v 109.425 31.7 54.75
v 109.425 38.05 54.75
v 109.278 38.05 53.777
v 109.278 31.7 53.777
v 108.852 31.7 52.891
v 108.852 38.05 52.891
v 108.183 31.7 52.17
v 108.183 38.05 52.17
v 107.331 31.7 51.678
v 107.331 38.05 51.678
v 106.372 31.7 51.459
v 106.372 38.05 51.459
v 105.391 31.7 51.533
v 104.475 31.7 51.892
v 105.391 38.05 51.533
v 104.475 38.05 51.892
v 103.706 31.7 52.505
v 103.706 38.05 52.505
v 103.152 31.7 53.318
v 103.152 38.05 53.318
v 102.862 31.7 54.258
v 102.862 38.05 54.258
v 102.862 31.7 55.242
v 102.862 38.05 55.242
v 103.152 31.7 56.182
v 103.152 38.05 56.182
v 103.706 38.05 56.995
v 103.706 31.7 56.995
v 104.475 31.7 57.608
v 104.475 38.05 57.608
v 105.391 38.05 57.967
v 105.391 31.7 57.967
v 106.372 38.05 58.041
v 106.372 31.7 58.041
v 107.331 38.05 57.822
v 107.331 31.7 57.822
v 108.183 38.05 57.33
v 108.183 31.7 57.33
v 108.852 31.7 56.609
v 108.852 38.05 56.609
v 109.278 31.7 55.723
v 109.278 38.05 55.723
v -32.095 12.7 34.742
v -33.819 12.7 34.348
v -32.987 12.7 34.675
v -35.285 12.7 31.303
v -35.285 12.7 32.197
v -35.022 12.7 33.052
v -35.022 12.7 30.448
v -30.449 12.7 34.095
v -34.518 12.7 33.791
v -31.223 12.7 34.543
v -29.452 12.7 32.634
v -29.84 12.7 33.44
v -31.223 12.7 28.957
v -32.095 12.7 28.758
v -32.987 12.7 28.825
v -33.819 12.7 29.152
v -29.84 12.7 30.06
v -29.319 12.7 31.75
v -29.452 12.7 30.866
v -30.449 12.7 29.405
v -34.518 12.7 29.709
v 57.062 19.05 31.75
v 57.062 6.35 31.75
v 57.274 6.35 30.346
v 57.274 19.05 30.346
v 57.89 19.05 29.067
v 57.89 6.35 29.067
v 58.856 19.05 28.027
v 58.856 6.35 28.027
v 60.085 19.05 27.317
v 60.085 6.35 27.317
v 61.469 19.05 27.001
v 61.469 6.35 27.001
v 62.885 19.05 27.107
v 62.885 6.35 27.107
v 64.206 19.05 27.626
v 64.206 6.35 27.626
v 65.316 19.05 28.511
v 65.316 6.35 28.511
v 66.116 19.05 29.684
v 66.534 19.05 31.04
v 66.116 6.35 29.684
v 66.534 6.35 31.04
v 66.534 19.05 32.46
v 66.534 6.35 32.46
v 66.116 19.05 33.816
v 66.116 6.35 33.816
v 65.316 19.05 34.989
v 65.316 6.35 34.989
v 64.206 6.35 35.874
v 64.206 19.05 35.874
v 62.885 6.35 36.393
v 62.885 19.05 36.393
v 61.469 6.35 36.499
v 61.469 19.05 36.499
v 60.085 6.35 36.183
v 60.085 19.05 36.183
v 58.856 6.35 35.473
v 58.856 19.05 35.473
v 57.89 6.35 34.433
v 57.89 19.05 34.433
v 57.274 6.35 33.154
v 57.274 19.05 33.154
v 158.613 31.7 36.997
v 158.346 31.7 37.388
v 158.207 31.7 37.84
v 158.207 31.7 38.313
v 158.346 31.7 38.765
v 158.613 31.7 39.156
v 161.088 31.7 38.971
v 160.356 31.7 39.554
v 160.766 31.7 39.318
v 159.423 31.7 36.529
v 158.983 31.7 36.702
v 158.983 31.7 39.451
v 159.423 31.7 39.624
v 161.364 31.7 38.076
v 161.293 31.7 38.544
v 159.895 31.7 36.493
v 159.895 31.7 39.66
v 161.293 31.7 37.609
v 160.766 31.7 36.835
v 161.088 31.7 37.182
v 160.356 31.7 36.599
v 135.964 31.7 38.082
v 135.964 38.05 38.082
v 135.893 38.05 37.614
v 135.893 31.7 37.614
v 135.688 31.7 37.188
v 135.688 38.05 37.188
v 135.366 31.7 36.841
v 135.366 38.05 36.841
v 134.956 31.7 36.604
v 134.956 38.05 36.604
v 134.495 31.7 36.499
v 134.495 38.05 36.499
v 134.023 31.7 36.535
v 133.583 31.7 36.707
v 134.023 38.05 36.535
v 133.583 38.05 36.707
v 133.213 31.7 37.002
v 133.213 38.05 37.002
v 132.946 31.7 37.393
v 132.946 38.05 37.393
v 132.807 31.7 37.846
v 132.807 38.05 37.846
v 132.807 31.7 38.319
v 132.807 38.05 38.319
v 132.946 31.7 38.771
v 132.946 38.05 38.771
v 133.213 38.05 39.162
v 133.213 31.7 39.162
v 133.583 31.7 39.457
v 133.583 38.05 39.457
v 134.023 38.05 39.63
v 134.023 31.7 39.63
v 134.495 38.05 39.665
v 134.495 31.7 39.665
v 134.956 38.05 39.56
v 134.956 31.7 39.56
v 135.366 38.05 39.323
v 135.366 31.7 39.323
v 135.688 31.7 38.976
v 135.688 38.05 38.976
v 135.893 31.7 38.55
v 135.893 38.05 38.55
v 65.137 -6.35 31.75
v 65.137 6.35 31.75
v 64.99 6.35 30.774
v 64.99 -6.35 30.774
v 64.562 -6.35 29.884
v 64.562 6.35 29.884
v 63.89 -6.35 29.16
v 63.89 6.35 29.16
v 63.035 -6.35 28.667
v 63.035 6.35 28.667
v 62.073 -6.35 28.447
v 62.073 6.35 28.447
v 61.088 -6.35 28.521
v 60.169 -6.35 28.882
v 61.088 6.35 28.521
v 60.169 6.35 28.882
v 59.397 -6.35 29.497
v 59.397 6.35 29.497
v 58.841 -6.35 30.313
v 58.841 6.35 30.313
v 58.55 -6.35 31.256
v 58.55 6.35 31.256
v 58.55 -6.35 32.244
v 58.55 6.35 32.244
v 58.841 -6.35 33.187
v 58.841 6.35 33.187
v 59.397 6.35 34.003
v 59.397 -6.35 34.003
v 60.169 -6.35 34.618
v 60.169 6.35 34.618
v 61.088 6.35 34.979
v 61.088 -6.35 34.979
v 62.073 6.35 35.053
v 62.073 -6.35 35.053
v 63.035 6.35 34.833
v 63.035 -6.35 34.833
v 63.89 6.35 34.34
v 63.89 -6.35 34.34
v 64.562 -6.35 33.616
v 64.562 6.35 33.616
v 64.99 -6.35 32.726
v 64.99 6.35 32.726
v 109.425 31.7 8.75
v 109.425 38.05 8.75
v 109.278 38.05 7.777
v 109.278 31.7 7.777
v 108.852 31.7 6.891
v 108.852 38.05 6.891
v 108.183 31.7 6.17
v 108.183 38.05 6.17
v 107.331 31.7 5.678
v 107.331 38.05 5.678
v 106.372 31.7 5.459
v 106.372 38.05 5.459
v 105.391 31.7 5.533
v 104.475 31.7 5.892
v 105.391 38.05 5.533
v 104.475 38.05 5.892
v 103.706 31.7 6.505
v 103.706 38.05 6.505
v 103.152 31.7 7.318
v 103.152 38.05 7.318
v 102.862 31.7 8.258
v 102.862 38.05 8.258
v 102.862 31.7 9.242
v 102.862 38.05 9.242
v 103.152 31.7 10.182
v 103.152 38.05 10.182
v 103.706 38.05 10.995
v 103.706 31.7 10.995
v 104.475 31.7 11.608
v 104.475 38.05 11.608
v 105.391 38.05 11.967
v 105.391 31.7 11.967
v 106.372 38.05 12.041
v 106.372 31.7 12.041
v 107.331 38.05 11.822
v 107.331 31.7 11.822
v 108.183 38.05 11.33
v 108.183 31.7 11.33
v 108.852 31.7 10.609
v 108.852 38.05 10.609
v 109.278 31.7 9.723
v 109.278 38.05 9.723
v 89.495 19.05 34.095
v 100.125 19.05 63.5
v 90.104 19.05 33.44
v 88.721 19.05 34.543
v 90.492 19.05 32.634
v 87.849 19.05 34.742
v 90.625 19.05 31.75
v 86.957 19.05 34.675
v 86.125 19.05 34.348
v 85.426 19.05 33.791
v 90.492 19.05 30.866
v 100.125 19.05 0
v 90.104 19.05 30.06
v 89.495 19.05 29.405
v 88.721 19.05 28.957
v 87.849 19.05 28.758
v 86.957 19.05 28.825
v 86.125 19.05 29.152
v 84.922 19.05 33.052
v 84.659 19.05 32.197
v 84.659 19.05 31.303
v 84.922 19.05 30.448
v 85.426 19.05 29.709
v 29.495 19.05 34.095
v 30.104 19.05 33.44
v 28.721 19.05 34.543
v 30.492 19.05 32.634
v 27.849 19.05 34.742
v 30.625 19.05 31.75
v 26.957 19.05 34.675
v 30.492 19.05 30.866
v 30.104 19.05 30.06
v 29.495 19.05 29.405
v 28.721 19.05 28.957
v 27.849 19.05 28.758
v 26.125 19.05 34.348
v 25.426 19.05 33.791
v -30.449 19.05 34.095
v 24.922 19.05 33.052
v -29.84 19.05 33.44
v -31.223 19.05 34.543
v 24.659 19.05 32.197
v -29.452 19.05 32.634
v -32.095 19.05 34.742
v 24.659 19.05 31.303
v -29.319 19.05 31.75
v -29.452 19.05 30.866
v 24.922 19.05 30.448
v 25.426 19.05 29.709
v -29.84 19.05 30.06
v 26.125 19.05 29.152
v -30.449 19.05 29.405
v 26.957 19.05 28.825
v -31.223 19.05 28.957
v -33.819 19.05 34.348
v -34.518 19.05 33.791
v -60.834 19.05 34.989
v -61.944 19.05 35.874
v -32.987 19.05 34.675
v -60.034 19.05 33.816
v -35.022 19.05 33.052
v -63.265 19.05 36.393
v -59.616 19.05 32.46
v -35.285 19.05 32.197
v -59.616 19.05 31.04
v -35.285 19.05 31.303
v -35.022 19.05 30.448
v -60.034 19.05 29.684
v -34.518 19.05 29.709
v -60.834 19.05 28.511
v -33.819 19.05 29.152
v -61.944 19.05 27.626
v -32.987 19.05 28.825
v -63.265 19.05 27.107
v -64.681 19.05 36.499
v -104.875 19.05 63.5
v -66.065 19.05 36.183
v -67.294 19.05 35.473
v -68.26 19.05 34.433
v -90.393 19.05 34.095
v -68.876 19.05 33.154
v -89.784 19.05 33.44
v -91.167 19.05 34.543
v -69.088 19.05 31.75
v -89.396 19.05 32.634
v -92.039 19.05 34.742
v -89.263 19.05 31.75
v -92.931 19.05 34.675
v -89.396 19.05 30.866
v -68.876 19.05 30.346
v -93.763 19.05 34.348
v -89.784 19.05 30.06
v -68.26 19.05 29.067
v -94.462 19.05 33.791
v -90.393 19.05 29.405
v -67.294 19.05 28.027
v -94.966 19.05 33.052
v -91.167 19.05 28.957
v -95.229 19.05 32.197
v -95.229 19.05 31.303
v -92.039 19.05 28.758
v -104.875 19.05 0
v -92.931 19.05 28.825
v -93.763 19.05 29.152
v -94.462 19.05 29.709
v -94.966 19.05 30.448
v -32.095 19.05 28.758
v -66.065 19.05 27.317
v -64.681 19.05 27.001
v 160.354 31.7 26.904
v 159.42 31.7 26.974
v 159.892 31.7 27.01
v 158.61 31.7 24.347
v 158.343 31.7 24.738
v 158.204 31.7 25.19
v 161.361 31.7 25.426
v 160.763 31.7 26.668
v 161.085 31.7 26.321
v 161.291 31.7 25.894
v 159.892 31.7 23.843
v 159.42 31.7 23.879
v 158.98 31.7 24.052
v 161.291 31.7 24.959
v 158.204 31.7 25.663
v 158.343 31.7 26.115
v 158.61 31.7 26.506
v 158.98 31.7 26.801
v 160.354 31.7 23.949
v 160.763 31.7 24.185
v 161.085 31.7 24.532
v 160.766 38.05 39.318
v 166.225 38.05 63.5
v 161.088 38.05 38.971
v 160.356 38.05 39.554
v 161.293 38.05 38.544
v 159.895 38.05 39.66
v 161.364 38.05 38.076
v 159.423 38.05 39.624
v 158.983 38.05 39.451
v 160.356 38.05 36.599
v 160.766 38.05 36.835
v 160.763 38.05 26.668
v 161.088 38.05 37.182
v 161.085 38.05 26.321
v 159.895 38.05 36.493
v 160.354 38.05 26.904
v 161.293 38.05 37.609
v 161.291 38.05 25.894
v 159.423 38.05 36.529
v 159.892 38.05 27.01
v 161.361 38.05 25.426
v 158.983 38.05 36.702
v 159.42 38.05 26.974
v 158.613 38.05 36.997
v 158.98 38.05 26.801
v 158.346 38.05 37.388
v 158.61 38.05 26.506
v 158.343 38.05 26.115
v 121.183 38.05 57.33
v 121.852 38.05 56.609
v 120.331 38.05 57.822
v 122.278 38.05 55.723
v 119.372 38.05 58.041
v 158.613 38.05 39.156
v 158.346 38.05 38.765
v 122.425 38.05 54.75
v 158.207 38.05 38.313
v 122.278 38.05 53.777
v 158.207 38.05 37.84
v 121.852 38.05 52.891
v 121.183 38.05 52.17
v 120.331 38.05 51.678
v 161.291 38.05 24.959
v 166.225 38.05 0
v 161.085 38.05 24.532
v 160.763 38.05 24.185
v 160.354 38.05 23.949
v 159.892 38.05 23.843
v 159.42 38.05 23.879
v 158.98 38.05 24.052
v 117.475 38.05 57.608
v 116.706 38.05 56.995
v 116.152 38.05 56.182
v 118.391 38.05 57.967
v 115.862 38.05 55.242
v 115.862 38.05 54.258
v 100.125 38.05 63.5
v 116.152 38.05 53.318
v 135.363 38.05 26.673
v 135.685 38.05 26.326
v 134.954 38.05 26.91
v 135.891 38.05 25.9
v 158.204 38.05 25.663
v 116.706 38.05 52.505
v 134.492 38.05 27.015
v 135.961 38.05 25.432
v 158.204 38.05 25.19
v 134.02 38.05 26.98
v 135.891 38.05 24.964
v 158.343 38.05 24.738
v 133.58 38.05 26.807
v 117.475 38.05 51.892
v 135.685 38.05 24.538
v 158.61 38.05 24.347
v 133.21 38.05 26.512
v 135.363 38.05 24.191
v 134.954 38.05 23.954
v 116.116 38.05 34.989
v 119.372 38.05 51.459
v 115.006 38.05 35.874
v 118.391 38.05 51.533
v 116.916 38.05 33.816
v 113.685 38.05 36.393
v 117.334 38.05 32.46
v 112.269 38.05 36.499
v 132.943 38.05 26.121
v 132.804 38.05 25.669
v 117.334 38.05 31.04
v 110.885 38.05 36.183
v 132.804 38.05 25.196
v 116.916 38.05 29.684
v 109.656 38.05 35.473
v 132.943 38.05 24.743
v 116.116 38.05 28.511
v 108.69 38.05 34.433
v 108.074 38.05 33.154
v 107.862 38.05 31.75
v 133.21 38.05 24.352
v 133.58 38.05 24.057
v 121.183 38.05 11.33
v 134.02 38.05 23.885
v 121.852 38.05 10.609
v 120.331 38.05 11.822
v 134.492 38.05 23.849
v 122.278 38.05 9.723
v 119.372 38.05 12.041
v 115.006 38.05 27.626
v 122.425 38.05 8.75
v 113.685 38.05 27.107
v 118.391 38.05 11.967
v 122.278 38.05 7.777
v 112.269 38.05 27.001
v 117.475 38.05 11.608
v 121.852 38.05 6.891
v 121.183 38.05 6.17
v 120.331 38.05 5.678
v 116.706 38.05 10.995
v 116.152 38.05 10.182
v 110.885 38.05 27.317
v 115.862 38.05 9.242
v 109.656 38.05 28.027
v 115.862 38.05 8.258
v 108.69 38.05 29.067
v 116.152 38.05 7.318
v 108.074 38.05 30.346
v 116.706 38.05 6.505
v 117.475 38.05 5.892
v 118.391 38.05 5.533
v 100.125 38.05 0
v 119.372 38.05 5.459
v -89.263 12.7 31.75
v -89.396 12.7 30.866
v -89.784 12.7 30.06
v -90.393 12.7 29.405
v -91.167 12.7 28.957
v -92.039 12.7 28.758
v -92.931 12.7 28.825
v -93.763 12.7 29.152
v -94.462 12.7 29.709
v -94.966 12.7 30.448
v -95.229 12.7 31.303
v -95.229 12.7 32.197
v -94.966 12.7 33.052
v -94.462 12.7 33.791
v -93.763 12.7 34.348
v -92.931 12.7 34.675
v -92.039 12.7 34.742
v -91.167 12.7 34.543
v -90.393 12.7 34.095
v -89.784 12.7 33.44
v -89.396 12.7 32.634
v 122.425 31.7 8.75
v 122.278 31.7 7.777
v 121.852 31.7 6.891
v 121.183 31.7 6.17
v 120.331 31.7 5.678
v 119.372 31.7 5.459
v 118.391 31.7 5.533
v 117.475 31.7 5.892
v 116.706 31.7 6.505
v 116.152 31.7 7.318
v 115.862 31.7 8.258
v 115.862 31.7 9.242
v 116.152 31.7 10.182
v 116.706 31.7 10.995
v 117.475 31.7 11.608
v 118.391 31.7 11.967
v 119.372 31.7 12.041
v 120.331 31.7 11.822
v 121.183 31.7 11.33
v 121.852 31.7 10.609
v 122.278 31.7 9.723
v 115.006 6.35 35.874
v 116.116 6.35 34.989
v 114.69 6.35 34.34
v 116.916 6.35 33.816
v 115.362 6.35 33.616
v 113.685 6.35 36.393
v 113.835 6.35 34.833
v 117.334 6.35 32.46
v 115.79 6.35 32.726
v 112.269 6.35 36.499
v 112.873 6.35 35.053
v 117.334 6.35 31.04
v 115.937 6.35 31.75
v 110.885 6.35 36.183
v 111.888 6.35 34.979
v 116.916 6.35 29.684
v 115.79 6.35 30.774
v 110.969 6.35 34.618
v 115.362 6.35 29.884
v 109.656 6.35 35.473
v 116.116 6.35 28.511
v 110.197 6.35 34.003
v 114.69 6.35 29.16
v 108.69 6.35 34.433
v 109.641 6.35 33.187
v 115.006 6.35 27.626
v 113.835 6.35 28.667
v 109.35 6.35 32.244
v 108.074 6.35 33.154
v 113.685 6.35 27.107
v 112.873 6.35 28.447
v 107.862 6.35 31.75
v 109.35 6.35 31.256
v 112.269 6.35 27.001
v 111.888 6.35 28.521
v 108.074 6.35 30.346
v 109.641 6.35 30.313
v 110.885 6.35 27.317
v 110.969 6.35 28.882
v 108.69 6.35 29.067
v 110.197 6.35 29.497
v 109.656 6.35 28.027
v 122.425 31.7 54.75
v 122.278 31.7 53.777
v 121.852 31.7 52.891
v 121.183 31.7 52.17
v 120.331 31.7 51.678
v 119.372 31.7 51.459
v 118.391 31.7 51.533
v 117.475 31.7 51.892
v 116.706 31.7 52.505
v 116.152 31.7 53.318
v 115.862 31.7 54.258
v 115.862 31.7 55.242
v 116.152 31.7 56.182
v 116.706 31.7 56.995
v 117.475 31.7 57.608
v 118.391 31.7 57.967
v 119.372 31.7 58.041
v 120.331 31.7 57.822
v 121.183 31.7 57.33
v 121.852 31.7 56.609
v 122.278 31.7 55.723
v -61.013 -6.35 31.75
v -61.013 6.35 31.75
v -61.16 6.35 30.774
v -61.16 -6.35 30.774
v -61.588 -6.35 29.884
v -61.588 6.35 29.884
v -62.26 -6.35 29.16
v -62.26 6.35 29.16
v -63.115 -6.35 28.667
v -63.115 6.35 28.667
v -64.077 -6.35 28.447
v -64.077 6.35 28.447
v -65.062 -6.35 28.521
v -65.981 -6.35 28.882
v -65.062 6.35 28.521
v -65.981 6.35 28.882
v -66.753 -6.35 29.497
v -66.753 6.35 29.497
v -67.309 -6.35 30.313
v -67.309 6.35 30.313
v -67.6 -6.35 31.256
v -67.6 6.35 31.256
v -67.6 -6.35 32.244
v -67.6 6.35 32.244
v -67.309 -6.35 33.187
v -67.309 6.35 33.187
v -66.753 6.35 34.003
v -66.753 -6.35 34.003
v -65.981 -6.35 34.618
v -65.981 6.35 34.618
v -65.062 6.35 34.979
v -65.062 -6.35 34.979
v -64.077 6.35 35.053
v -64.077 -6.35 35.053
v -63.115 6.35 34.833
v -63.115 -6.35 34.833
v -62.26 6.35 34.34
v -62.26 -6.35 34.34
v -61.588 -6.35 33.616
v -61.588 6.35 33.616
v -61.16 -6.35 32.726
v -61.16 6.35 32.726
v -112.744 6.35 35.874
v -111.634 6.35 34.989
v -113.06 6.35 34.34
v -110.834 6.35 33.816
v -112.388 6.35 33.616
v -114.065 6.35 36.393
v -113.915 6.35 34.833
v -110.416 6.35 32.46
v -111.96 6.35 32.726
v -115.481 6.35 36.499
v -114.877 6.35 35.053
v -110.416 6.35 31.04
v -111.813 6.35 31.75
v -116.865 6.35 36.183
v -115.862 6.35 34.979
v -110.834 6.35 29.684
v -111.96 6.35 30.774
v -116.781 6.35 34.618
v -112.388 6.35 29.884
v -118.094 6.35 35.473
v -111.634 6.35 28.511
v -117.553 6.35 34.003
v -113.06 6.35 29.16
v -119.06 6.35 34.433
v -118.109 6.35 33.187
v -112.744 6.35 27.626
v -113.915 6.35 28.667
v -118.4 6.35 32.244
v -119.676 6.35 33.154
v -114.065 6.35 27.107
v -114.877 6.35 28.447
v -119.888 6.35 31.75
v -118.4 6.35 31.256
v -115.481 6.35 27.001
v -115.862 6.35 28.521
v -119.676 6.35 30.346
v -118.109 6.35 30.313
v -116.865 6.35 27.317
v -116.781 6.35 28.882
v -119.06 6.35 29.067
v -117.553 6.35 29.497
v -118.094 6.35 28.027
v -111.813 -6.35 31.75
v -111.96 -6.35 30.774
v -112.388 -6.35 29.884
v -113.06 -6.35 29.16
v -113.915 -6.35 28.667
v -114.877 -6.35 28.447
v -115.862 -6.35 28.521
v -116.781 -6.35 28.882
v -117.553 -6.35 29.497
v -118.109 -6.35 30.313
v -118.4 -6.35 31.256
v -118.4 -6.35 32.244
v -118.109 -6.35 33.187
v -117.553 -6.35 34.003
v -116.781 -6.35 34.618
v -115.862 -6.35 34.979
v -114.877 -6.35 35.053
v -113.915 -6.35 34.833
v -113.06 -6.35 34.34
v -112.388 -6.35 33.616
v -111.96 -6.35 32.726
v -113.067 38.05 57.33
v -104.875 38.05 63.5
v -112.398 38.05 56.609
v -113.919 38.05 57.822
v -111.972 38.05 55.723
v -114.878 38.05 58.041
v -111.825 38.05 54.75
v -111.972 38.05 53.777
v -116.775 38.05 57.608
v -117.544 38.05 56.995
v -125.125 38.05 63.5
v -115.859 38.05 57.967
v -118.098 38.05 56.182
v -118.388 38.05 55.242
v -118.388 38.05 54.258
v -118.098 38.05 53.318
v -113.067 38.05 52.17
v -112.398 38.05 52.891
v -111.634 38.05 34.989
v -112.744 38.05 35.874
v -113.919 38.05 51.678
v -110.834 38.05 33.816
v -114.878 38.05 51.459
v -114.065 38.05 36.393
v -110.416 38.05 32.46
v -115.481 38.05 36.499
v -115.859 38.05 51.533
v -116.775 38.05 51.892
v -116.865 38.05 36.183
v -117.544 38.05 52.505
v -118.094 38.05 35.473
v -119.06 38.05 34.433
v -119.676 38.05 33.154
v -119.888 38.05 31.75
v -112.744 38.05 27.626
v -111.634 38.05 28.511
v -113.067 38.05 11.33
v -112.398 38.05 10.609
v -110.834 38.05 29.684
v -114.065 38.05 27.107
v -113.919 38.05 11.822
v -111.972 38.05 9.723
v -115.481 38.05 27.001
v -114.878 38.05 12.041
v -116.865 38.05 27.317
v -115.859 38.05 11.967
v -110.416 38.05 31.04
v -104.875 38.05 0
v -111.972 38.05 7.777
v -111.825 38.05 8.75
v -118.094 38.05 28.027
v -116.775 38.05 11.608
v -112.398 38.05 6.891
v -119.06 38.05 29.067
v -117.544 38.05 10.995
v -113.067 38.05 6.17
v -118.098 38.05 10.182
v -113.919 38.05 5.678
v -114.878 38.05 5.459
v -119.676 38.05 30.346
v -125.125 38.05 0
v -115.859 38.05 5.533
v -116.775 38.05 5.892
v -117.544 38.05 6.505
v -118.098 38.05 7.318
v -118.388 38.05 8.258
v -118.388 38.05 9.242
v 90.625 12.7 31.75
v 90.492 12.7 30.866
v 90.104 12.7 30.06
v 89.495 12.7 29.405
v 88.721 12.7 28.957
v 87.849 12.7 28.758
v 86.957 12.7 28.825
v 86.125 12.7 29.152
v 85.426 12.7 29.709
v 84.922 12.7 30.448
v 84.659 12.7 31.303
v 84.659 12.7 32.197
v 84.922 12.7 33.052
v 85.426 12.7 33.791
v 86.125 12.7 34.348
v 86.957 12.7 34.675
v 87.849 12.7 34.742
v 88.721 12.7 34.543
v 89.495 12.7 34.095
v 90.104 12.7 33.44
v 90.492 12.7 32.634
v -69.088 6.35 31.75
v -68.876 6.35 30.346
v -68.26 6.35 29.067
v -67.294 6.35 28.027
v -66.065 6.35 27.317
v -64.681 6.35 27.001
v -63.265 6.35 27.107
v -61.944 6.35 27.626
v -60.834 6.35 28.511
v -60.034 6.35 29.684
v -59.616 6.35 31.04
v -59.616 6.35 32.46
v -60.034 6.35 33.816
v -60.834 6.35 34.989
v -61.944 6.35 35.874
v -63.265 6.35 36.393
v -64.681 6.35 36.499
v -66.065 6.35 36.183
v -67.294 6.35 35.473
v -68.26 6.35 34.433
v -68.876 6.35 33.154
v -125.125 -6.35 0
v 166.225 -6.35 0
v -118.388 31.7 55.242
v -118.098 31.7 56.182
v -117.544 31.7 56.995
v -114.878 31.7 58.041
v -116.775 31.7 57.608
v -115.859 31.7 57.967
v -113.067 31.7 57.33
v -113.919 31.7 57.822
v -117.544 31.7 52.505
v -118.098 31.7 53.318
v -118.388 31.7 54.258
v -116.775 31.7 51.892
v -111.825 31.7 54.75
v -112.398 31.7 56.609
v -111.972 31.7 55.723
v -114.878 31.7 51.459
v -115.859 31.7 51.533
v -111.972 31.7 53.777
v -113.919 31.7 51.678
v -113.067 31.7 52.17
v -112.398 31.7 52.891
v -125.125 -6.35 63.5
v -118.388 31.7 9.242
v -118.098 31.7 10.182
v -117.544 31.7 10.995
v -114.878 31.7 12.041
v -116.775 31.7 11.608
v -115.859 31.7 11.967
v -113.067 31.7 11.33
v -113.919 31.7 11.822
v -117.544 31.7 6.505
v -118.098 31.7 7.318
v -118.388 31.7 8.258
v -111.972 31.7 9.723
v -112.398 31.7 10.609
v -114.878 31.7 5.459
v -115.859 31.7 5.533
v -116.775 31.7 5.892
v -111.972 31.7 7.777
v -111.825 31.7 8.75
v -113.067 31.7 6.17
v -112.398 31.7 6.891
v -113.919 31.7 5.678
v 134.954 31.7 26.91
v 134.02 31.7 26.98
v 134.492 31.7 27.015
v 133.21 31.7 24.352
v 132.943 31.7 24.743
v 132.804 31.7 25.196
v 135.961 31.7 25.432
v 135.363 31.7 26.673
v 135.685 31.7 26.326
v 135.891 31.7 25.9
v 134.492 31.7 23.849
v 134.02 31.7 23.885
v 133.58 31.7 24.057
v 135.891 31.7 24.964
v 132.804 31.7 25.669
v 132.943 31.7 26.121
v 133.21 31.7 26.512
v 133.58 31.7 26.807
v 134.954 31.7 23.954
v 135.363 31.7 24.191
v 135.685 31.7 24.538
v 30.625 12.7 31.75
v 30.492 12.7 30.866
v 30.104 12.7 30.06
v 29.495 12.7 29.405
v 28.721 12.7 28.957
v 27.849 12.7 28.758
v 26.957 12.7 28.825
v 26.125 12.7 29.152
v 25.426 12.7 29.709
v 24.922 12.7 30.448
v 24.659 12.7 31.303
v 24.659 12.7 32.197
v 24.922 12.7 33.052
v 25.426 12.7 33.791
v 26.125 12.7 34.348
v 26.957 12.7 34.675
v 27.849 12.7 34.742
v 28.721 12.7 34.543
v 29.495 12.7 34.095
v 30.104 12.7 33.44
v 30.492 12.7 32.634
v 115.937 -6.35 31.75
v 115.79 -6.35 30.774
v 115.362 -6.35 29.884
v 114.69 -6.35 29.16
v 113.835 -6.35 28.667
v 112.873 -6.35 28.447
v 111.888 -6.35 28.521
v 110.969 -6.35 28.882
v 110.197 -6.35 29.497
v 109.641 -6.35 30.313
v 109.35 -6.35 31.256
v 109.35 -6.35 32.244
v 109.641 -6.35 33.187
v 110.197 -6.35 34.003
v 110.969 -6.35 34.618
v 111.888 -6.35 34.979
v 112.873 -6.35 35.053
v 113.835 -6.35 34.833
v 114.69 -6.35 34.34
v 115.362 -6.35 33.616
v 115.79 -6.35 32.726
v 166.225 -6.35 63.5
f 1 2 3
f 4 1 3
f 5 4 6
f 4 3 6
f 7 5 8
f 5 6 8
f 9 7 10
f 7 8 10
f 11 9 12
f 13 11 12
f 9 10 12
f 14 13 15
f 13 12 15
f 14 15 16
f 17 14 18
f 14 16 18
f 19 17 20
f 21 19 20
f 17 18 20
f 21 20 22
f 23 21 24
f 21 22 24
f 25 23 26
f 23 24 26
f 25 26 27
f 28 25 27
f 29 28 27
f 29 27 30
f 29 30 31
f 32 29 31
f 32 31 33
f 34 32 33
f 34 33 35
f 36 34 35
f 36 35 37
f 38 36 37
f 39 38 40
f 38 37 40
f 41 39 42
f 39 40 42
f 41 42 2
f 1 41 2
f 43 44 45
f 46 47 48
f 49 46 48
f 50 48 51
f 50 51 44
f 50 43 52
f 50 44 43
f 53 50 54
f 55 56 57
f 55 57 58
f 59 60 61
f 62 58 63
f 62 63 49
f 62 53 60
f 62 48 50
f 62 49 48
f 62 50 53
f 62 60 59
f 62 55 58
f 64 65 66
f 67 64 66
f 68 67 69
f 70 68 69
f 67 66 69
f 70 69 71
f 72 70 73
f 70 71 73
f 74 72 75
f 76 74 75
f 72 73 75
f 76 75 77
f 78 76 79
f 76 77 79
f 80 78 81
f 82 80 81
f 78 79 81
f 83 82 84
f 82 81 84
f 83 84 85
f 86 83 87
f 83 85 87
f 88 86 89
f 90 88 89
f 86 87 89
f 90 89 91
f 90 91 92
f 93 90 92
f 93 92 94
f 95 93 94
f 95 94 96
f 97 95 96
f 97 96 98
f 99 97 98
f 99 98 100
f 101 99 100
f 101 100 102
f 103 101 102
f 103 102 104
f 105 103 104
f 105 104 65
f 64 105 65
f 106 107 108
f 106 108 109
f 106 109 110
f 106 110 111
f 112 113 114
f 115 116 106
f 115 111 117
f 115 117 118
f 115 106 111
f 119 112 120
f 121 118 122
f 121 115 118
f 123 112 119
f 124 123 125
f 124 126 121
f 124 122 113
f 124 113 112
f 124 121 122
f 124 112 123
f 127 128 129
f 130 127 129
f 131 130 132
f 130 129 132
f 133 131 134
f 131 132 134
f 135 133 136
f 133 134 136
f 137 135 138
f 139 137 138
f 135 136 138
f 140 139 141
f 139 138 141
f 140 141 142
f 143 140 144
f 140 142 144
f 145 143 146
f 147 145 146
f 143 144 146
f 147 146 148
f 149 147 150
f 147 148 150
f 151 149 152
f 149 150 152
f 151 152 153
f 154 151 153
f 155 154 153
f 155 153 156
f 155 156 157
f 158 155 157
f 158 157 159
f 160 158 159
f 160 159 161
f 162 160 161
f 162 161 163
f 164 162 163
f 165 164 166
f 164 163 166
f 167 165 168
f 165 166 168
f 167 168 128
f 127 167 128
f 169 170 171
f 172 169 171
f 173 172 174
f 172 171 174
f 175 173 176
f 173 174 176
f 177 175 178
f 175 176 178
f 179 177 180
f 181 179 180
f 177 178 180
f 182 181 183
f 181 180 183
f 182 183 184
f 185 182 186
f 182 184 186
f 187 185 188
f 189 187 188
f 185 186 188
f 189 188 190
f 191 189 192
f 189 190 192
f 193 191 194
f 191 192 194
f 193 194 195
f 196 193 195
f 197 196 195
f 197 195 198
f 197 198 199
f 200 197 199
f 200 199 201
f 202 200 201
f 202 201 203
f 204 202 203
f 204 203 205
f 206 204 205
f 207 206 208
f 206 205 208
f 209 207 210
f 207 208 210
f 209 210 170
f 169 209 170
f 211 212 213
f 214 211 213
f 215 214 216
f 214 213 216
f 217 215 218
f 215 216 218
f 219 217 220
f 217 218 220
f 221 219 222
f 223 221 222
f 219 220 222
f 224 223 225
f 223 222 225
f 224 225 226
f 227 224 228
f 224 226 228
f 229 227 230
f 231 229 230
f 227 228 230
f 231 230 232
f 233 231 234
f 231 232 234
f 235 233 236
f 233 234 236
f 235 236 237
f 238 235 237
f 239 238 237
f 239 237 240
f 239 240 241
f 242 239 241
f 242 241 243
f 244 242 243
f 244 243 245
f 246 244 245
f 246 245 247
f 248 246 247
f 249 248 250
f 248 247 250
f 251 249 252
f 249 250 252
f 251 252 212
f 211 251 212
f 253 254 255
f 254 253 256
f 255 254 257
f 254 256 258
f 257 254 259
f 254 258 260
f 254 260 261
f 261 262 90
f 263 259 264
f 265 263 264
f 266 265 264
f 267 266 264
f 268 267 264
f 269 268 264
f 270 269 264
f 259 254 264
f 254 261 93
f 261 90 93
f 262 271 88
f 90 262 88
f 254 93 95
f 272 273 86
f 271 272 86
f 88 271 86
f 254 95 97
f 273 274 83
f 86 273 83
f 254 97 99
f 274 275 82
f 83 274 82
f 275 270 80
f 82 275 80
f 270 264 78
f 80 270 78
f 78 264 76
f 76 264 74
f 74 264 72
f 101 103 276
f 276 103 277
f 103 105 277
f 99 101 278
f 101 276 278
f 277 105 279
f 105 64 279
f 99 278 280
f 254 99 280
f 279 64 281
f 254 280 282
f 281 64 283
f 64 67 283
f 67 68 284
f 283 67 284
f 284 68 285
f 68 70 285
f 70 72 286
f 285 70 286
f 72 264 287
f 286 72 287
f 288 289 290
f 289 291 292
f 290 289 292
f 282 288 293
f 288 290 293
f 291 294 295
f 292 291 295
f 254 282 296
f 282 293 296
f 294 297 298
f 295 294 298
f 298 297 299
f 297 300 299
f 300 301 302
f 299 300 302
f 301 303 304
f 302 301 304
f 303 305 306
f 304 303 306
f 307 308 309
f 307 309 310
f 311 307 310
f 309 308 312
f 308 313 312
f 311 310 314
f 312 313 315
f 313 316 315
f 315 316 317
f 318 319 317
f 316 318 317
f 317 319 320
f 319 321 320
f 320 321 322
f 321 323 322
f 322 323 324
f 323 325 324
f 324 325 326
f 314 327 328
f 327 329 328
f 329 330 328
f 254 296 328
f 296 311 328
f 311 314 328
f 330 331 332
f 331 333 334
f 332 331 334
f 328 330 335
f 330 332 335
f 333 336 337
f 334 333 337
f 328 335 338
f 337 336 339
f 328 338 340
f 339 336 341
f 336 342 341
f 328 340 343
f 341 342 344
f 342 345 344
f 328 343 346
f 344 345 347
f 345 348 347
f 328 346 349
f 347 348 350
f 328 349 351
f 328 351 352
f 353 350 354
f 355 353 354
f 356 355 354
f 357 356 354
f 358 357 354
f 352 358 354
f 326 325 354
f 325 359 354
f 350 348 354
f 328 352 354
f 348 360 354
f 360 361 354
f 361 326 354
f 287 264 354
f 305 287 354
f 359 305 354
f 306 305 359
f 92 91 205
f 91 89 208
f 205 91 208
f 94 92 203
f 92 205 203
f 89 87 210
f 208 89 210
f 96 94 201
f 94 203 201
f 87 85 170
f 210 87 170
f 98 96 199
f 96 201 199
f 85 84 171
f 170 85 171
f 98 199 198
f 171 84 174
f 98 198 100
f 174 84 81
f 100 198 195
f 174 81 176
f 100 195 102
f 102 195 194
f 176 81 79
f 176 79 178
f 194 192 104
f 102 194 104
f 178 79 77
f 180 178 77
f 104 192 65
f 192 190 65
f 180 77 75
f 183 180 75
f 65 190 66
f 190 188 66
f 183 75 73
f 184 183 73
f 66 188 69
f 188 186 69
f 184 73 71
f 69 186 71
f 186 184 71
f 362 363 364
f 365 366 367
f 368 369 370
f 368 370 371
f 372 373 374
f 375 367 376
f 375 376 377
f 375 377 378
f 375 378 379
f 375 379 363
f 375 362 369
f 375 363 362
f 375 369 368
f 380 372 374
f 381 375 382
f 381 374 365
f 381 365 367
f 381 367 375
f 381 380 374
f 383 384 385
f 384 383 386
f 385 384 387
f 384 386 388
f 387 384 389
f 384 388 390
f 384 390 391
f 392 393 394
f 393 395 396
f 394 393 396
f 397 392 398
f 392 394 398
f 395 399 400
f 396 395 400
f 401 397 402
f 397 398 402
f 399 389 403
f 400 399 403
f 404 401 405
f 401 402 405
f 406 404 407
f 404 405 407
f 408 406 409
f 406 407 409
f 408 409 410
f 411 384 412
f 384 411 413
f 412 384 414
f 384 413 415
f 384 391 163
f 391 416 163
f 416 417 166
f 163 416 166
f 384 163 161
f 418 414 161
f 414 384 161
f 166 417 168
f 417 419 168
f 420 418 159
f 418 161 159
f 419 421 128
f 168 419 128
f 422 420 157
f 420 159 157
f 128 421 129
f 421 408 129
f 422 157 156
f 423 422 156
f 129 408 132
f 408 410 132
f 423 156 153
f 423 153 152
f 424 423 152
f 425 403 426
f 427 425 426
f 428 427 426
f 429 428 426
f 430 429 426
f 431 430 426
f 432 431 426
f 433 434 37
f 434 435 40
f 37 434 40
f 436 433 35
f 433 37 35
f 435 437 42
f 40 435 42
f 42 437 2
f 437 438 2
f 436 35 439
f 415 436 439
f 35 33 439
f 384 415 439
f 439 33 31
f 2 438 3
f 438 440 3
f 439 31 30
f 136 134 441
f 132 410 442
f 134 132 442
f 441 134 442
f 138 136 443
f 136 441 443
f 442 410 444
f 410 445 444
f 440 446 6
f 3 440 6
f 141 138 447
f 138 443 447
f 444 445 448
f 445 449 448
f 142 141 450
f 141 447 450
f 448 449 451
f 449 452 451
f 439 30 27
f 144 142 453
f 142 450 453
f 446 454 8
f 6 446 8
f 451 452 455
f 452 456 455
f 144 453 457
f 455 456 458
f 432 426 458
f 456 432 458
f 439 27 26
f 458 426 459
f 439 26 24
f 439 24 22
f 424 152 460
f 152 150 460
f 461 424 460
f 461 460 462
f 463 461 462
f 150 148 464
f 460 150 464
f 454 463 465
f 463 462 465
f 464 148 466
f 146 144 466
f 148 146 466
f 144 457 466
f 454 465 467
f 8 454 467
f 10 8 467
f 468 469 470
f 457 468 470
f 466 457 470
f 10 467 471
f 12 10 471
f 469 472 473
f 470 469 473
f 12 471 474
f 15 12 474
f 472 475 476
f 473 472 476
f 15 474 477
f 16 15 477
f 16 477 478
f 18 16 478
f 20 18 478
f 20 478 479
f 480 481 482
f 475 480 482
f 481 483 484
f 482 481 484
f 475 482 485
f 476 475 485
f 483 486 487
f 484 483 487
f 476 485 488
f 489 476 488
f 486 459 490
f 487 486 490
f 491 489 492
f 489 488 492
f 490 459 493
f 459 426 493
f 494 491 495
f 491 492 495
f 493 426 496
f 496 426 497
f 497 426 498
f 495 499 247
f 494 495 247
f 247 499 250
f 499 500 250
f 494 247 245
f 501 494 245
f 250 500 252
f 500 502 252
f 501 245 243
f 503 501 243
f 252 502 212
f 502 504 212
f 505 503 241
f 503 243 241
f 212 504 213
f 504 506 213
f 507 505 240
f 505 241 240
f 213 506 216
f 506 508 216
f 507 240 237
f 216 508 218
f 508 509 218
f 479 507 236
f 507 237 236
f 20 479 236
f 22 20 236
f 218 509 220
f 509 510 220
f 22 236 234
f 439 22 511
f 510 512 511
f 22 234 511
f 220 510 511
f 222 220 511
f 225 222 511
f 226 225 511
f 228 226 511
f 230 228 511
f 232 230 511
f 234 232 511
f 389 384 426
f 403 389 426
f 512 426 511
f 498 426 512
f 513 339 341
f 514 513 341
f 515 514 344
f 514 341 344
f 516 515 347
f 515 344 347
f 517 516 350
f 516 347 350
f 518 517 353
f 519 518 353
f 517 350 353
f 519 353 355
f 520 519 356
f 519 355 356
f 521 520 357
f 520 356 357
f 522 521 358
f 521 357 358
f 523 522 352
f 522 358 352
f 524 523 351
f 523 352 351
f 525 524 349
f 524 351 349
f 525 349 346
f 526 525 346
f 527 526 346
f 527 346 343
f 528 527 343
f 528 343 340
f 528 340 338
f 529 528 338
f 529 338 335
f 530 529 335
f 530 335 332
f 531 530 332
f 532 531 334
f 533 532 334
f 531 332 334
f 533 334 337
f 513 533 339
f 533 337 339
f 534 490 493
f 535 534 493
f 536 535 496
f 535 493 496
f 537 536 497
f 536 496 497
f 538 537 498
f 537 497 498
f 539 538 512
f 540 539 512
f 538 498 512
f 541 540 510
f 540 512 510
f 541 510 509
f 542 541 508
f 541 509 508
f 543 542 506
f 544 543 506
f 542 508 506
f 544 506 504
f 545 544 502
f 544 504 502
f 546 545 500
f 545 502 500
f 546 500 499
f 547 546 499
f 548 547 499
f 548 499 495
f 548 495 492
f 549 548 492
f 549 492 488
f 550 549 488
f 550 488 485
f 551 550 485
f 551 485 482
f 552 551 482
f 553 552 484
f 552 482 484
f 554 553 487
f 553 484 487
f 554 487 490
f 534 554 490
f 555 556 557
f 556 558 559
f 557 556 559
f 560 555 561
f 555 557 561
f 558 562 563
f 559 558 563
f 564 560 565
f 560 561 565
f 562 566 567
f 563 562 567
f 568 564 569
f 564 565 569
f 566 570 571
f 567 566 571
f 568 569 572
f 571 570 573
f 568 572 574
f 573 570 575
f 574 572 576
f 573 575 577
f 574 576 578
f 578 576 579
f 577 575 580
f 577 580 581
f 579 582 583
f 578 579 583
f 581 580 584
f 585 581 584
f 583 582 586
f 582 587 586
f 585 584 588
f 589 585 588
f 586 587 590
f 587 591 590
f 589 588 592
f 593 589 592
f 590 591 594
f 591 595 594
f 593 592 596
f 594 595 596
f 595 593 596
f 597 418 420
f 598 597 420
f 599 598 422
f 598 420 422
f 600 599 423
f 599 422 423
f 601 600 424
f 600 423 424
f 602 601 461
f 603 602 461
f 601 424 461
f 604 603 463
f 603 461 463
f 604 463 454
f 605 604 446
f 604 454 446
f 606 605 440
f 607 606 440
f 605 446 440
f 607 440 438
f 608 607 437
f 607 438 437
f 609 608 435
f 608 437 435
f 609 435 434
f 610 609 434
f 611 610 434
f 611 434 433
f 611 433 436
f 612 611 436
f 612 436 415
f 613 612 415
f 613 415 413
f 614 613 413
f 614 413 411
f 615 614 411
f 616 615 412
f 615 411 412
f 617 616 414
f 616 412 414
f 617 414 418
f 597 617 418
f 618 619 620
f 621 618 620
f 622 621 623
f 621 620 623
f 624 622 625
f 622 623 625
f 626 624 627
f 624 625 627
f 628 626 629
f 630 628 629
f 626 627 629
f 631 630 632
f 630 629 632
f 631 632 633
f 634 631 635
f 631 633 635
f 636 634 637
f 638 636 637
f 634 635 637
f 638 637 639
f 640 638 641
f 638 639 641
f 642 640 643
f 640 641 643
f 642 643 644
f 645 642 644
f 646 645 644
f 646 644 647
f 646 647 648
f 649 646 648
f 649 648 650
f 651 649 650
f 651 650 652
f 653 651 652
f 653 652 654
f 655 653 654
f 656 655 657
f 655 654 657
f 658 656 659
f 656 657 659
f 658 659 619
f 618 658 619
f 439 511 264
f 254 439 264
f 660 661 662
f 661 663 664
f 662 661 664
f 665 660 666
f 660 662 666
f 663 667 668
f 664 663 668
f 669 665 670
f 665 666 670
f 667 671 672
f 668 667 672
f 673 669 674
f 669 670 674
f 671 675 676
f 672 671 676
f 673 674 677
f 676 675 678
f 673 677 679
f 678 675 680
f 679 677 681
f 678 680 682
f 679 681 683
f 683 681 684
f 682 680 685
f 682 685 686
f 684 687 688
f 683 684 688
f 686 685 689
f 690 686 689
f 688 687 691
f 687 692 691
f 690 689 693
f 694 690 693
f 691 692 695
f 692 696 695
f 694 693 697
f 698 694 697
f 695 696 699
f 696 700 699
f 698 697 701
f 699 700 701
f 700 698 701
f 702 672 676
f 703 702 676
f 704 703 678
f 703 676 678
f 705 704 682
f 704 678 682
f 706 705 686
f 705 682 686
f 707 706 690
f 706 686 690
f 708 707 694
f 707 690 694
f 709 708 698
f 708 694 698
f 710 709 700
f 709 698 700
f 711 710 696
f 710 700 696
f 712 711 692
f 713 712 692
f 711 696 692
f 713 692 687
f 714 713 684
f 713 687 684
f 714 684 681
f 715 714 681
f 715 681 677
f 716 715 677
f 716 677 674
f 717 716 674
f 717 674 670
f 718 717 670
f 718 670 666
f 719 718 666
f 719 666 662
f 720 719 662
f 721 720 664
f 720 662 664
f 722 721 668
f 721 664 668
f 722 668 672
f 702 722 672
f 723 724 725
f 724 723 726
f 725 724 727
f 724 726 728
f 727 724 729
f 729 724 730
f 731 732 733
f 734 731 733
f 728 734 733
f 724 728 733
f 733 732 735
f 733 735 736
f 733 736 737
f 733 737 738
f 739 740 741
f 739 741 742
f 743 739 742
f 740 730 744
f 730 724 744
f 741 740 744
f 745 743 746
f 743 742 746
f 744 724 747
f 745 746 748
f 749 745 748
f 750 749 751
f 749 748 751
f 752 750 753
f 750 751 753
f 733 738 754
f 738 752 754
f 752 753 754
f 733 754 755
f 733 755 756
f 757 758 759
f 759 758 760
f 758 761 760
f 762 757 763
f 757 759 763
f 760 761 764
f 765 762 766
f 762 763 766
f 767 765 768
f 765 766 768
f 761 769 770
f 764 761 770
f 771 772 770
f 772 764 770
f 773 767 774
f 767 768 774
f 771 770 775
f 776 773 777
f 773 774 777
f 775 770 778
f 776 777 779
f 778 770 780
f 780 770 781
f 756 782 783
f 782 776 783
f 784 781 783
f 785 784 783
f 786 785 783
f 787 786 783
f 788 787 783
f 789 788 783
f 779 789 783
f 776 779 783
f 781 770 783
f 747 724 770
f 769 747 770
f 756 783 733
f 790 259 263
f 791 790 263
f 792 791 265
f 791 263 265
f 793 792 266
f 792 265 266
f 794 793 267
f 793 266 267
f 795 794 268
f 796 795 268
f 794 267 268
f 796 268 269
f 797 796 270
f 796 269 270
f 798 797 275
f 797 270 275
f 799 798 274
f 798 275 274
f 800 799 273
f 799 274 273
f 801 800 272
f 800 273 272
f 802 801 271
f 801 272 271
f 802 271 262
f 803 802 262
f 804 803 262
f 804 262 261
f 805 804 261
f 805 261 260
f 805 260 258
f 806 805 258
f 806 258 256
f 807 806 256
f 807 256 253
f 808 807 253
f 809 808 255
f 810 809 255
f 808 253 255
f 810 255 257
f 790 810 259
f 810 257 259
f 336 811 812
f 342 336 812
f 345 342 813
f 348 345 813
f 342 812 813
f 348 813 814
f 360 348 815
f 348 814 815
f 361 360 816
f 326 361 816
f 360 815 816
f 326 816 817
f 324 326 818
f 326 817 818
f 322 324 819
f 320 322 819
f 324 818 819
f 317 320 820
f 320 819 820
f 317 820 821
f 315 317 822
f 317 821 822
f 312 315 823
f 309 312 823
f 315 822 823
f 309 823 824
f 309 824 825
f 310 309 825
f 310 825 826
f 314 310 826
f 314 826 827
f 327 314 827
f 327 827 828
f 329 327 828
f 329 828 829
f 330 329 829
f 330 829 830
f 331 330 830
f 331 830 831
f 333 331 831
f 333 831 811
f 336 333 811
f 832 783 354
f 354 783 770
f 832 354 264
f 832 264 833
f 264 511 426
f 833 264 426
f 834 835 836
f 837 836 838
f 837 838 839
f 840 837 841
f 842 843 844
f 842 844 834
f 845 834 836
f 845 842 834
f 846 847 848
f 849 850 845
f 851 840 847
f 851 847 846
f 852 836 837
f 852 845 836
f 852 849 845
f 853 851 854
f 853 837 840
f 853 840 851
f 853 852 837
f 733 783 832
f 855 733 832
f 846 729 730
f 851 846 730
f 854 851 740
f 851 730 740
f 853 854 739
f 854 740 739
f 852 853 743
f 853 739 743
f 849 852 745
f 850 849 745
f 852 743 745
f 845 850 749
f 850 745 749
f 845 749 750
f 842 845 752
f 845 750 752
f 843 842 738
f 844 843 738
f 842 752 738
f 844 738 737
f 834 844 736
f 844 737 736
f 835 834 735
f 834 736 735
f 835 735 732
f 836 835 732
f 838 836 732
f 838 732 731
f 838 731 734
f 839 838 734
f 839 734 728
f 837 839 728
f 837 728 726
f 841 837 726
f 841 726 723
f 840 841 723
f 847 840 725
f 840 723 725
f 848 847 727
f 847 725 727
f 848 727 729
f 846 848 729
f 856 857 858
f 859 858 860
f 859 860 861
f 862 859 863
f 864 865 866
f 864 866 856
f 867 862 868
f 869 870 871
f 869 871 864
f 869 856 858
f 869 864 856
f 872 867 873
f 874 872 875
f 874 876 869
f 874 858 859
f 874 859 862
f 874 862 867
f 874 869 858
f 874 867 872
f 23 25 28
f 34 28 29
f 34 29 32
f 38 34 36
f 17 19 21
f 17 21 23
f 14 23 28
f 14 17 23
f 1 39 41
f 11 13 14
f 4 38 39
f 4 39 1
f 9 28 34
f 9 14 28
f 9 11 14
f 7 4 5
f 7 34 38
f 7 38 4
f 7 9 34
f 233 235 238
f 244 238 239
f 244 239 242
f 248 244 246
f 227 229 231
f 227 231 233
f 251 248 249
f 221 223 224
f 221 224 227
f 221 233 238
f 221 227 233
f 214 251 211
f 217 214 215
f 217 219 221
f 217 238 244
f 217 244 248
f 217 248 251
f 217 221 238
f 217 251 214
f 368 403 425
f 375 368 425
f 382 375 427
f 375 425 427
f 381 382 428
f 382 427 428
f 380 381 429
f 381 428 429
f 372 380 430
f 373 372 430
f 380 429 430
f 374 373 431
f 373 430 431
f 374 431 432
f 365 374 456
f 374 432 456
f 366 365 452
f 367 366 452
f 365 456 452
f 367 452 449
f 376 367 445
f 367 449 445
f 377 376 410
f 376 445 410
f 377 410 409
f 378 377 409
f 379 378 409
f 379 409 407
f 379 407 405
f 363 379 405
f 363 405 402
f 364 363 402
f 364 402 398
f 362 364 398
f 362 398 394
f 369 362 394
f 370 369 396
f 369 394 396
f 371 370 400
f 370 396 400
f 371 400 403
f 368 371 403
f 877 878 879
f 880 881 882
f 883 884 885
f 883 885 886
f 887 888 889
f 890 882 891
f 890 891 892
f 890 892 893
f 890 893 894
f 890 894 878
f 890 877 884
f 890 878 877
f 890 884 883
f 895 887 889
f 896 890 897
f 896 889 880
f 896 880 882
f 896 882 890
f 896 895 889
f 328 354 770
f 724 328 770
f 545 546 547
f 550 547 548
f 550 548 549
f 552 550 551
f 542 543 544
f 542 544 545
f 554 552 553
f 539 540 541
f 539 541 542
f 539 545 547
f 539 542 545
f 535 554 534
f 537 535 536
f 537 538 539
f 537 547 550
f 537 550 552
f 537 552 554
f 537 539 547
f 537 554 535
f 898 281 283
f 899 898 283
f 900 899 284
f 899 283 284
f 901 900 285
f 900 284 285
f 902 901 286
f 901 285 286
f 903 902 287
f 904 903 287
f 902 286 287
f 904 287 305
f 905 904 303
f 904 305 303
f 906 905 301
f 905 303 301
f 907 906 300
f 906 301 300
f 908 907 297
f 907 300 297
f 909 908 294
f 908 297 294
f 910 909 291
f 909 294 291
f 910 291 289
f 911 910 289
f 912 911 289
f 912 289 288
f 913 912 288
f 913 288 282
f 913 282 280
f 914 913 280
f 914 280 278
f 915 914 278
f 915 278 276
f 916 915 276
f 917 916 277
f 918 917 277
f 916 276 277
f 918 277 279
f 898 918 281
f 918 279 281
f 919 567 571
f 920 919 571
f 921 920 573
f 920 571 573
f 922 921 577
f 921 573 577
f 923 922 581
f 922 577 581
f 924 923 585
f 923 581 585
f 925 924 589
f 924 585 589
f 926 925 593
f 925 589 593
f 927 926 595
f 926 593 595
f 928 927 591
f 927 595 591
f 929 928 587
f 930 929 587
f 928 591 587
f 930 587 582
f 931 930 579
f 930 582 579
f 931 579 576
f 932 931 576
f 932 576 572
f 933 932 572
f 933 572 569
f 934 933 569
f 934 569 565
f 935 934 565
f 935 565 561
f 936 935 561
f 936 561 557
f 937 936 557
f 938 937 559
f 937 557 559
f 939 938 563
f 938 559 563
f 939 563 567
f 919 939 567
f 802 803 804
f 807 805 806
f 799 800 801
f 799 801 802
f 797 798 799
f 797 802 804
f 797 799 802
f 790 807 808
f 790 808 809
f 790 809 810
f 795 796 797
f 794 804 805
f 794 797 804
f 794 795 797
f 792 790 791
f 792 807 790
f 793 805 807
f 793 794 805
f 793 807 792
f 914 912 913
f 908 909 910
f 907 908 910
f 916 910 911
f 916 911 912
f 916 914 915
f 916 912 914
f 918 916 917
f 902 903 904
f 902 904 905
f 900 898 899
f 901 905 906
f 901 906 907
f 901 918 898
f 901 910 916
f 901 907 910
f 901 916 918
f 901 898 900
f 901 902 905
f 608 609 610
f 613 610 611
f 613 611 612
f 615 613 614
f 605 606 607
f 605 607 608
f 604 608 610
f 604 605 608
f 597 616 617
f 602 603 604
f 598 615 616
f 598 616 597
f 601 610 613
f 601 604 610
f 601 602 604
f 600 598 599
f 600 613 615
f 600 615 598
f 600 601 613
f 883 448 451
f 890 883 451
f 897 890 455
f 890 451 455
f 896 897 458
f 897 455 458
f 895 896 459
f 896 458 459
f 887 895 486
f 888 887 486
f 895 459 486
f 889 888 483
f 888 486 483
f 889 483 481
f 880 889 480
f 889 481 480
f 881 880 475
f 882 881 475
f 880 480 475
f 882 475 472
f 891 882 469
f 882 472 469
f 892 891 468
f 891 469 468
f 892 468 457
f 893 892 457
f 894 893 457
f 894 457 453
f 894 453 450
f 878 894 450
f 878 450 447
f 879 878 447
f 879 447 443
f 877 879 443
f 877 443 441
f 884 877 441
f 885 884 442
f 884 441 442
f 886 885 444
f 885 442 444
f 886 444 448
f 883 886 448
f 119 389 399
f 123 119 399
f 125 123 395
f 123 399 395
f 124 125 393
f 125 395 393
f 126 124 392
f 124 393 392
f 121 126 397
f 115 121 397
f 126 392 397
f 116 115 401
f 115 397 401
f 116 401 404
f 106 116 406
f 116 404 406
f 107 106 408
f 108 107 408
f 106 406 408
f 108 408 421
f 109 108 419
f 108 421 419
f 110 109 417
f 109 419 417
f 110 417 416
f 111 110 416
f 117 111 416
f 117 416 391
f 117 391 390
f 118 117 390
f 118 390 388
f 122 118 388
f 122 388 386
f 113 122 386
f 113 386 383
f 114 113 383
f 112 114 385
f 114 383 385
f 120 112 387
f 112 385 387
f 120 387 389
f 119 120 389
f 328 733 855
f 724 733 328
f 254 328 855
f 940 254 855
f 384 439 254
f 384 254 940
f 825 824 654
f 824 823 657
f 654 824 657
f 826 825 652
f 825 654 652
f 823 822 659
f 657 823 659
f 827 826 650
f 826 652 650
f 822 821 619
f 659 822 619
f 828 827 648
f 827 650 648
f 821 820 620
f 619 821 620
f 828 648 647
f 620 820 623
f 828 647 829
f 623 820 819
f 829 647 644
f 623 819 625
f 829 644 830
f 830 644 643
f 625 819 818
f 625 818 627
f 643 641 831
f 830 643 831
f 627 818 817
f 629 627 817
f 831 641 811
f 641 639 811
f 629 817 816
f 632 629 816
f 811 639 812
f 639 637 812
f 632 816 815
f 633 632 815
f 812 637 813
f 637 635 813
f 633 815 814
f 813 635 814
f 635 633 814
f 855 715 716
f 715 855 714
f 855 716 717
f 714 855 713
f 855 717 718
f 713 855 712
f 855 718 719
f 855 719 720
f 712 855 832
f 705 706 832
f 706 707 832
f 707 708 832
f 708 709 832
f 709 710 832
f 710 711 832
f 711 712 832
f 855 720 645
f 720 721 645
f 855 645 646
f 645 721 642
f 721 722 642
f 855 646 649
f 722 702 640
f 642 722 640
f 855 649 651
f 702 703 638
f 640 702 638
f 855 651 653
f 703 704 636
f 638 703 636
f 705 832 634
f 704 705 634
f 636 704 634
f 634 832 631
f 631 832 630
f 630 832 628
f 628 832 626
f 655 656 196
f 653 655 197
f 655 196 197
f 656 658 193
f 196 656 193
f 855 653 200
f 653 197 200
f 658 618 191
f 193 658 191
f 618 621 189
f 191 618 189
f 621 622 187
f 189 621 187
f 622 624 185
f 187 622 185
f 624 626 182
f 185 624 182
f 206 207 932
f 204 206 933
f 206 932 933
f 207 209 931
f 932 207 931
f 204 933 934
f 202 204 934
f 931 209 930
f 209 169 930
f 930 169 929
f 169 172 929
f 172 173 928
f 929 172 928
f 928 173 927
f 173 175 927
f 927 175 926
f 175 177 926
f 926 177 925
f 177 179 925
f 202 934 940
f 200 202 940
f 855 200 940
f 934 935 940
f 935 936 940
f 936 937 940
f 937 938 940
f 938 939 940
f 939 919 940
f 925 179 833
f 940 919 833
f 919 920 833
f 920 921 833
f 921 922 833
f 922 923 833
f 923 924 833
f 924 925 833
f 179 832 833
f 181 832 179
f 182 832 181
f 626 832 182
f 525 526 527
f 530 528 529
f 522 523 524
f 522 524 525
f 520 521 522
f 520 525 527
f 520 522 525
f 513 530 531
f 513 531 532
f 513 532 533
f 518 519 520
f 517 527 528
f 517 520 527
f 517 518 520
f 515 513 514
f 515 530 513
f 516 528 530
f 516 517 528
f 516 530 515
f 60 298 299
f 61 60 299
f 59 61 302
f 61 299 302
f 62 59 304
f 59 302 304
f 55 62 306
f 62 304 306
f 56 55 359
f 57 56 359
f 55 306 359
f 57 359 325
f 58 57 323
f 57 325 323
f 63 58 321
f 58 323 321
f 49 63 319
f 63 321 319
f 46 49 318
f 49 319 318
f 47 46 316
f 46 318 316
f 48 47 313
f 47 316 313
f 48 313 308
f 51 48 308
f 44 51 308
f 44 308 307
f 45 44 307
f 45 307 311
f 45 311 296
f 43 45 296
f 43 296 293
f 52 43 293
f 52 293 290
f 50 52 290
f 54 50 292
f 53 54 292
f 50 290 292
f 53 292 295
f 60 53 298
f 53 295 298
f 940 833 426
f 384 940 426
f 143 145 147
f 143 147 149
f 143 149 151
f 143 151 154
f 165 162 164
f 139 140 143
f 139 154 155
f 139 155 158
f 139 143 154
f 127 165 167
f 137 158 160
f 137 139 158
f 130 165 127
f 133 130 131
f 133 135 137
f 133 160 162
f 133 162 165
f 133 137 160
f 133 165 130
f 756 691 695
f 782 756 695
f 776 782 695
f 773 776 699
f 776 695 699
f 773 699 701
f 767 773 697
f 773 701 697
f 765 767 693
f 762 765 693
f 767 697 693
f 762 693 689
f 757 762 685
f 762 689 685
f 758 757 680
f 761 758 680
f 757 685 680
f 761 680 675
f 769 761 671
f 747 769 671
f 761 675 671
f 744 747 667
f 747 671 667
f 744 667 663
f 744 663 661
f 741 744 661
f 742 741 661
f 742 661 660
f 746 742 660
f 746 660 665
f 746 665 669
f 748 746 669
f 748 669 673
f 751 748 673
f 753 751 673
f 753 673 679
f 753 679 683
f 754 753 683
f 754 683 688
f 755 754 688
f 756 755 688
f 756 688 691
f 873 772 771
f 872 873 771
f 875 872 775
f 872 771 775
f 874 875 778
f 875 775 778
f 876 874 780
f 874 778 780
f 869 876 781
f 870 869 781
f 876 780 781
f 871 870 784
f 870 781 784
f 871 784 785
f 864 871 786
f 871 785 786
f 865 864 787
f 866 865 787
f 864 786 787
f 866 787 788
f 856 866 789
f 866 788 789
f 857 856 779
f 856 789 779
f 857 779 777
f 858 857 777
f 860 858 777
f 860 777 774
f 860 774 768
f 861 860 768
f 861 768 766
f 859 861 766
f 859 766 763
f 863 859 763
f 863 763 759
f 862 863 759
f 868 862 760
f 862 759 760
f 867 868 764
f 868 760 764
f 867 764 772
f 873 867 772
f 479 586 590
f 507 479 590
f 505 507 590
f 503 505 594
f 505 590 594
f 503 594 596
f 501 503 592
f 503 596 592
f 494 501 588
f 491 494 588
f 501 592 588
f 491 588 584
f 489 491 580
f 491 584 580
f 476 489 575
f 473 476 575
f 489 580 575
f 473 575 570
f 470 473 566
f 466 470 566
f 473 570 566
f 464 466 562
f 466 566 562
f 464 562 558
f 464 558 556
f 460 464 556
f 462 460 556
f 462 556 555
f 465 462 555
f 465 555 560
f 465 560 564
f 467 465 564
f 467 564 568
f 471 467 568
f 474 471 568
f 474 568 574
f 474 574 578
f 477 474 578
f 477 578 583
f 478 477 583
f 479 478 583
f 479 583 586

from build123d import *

# Parameters (mm, degrees)
SKETCH1_W                       = 41.1
SKETCH1_H                       = 38.05
MAIN_EXTRUDE_DEPTH              = 63.5
SKETCH3_R                       = 3.3
RAIL_BLOCK_MOUNTING_HOLES_DEPTH = 6.35
SKETCH4_R                       = 1.5875
MOTOR_MOUNTING_HOLES_DEPTH      = 6.35
SKETCH8_R                       = 3
RAIL_MOUNTING_HOLES_DEPTH       = 6.35
SKETCH5_R                       = 3.31216
CUT_EXTRUDE3_DEPTH              = 39.05
CUT_EXTRUDE3_DEPTH_BACK         = 7.35
SKETCH7_R                       = 4.7625
CUT_EXTRUDE6_DEPTH              = 32.7


with BuildPart() as part:
    # Sketch1 → Main Extrude (new body)
    with BuildSketch(Plane.XY):
        Polygon((125.125, 0), (-125.125, 0), (-125.125, -6.35), (166.225, -6.35), (166.225, 0), align=None)
        Polygon((-125.125, 38.05), (-125.125, 0), (125.125, 0), (125.125, 38.05), (100.125, 38.05), (100.125, 19.05), (-104.875, 19.05), (-104.875, 38.05), align=None)
        with Locations((145.675, 19.025)):
            Rectangle(SKETCH1_W, SKETCH1_H)
    extrude(amount=MAIN_EXTRUDE_DEPTH)

    # Sketch3 → Rail Block Mounting Holes (cut)
    with BuildSketch(Plane(origin=(0, 38.05, 0), x_dir=(1, 0, 0), z_dir=(0, 1, 0))):
        with Locations((106.125, -54.75)):
            Circle(SKETCH3_R)
        with Locations((119.125, -54.75)):
            Circle(SKETCH3_R)
        with Locations((106.125, -8.75)):
            Circle(SKETCH3_R)
        with Locations((119.125, -8.75)):
            Circle(SKETCH3_R)
        with Locations((-115.125, -54.75)):
            Circle(SKETCH3_R)
        with Locations((-115.125, -8.75)):
            Circle(SKETCH3_R)
    extrude(amount=-RAIL_BLOCK_MOUNTING_HOLES_DEPTH, mode=Mode.SUBTRACT)

    # Sketch4 → Motor Mounting Holes (cut)
    with BuildSketch(Plane(origin=(0, 38.05, 0), x_dir=(1, 0, 0), z_dir=(0, 1, 0))):
        with Locations((134.373571068, -25.432199749)):
            Circle(SKETCH4_R)
        with Locations((159.773570419, -25.426458163)):
            Circle(SKETCH4_R)
        with Locations((159.77642991, -38.07645784)):
            Circle(SKETCH4_R)
        with Locations((134.376430559, -38.082199426)):
            Circle(SKETCH4_R)
    extrude(amount=-MOTOR_MOUNTING_HOLES_DEPTH, mode=Mode.SUBTRACT)

    # Sketch8 → Rail Mounting Holes (cut)
    with BuildSketch(Plane(origin=(0, 19.05, 0), x_dir=(1, 0, 0), z_dir=(0, 1, 0))):
        with Locations((87.625, -31.75)):
            Circle(SKETCH8_R)
        with Locations((27.625, -31.75)):
            Circle(SKETCH8_R)
        with Locations((-32.319, -31.75)):
            Circle(SKETCH8_R)
        with Locations((-92.263, -31.75)):
            Circle(SKETCH8_R)
    extrude(amount=-RAIL_MOUNTING_HOLES_DEPTH, mode=Mode.SUBTRACT)

    # Sketch5 → Cut-Extrude3 (cut, two sides)
    with BuildSketch(Plane(origin=(0, 0, 0), x_dir=(1, 0, 0), z_dir=(0, 1, 0))) as cut_extrude3_sk:
        with Locations((-115.125, -31.75)):
            Circle(SKETCH5_R)
        with Locations((-64.325, -31.75)):
            Circle(SKETCH5_R)
        with Locations((61.825, -31.75)):
            Circle(SKETCH5_R)
        with Locations((112.625, -31.75)):
            Circle(SKETCH5_R)
    extrude(amount=CUT_EXTRUDE3_DEPTH, mode=Mode.SUBTRACT)
    extrude(cut_extrude3_sk.sketch, amount=-CUT_EXTRUDE3_DEPTH_BACK, mode=Mode.SUBTRACT)

    # Sketch7 → Cut-Extrude6 (cut, through all)
    with BuildSketch(Plane(origin=(0, 6.35, 0), x_dir=(-1, 0, 0), z_dir=(0, -1, 0))):
        with Locations((115.125, -31.75)):
            Circle(SKETCH7_R)
        with Locations((64.325, -31.75)):
            Circle(SKETCH7_R)
        with Locations((-112.625, -31.75)):
            Circle(SKETCH7_R)
        with Locations((-61.825, -31.75)):
            Circle(SKETCH7_R)
    extrude(amount=-CUT_EXTRUDE6_DEPTH, mode=Mode.SUBTRACT)


solid = part.part
